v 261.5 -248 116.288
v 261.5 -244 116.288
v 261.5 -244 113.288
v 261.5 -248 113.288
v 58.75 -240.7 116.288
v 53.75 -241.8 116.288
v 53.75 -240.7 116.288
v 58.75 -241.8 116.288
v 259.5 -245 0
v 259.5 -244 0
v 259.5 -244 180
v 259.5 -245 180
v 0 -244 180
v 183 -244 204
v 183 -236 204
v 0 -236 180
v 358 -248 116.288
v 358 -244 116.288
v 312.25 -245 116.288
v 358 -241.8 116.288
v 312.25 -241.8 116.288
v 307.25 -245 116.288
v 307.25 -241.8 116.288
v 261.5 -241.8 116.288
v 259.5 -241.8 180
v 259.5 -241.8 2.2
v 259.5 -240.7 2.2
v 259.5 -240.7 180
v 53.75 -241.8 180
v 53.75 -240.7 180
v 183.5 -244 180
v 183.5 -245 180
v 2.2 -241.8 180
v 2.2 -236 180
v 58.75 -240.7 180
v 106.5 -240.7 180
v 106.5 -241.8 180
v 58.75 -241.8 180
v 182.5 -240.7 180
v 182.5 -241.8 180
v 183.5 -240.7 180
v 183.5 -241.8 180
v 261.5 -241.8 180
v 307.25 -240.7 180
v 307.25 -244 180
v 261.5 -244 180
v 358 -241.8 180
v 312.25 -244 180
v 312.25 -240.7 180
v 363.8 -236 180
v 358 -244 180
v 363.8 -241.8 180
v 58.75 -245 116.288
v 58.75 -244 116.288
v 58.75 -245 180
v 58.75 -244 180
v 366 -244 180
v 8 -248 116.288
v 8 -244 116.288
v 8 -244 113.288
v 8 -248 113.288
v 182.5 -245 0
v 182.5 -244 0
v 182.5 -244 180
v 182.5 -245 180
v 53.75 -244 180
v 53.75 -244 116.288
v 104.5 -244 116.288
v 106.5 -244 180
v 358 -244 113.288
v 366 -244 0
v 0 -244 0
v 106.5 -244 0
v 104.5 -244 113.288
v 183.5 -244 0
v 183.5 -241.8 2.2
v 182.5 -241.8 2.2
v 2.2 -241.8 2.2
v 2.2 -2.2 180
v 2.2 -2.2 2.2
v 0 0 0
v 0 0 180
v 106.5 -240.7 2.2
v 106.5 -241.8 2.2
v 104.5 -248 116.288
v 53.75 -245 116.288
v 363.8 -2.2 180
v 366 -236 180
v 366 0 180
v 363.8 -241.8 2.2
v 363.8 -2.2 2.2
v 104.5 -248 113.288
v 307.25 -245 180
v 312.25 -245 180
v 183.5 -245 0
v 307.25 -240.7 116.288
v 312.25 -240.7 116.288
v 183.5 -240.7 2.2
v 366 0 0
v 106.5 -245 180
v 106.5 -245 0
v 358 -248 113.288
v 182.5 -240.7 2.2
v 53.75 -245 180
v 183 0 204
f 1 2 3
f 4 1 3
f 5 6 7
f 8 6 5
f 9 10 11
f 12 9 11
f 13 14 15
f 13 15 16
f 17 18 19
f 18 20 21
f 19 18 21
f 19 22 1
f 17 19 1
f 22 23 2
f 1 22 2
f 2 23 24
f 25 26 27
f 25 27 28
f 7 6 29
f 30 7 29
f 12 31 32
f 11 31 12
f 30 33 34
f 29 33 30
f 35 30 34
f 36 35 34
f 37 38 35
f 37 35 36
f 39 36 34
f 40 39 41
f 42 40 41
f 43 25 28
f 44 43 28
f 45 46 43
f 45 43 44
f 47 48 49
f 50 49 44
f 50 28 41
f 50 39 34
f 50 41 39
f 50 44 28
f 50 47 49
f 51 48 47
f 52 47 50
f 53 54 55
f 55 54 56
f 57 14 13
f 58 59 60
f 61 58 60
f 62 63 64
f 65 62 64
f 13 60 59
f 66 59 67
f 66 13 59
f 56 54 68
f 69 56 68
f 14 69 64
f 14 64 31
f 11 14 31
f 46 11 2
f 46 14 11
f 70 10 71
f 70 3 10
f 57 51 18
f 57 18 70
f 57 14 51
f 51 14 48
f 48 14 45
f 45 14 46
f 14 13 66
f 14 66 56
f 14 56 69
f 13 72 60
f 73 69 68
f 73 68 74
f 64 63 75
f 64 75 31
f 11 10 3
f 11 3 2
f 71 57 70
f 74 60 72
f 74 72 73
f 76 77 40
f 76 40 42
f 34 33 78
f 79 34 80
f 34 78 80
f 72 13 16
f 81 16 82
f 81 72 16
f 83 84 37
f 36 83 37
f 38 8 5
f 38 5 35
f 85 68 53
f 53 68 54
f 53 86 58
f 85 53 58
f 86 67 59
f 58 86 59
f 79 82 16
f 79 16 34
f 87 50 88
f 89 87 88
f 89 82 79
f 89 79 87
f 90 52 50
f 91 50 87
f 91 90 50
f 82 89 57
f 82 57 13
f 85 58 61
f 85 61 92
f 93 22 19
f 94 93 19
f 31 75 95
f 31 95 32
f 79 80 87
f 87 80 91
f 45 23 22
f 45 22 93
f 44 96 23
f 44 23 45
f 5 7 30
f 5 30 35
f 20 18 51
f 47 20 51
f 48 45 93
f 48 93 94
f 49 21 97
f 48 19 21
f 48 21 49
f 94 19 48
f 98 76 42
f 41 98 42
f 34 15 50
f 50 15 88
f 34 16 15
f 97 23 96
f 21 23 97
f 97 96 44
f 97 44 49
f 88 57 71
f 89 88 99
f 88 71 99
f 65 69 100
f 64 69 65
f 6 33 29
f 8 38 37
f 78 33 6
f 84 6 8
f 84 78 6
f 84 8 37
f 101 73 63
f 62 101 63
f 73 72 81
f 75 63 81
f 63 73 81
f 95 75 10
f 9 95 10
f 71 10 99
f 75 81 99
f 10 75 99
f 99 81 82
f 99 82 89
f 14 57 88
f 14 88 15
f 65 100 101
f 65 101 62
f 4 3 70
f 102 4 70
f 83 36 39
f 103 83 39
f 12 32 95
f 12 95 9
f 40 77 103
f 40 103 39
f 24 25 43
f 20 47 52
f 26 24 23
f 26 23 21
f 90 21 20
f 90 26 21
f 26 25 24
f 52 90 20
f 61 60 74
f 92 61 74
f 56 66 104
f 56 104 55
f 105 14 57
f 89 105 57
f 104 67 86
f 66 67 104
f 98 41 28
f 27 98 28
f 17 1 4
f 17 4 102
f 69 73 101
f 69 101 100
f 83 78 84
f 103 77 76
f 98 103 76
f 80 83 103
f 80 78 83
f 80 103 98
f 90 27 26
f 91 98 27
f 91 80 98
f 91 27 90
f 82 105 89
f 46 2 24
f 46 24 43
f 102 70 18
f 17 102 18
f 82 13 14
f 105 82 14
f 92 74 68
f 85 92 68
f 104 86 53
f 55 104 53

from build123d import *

# Parameters (mm, degrees)
F0_W          = 366
F0_H          = 244
F0_W_2        = 361.6
F0_H_2        = 239.6
F1_DEPTH      = 180
F2_DEPTH      = 2.2
F3_W          = 76
F3_H          = 180
F3_W_2        = 5
F3_H_2        = 63.7124854326
F4_DEPTH      = 1
F4_DEPTH_BACK = 3.3
F3_W_3        = 45.75
F5_DEPTH      = 25
F6_DEPTH      = 8
F7_DEPTH      = 4
F9_DEPTH      = 244


# Not quite as in the source:
# - a feature names something its author has since deleted; it is built from what else it names


with BuildPart() as f1:
    # F0 (on Top) → F1 (new body)
    with BuildSketch(Plane.XY):
        with Locations((183, -122)):
            Rectangle(F0_W, F0_H)
        with Locations((183, -122)):
            Rectangle(F0_W_2, F0_H_2, mode=Mode.SUBTRACT)
    extrude(amount=F1_DEPTH)

    # F0 (on Top) → F2 (join)
    with BuildSketch(Plane.XY):
        with Locations((183, -122)):
            Rectangle(F0_W_2, F0_H_2)
    extrude(amount=F2_DEPTH)

    # F3 (on face) → F4 (join, two sides)
    with BuildSketch(Plane.XZ.offset(244)) as f4_sk:
        with Locations((144.5, 90)):
            Rectangle(F3_W, F3_H)
        with Locations((221.5, 90)):
            Rectangle(F3_W, F3_H)
        with Locations((56.25, 148.1437572837)):
            Rectangle(F3_W_2, F3_H_2)
        with Locations((309.75, 148.1437572837)):
            Rectangle(F3_W_2, F3_H_2)
    extrude(amount=F4_DEPTH)
    extrude(f4_sk.sketch, amount=-F4_DEPTH_BACK)

    # F3 (on face) → F5 (cut)
    with BuildSketch(Plane.XZ.offset(244)):
        Polygon((104.5, 180), (106.5, 180), (182.5, 180), (183.5, 180), (259.5, 180), (261.5, 180), (307.25, 180), (312.25, 180), (358, 180), (366, 180), (183, 204), (0, 180), (8, 180), (53.75, 180), (58.75, 180), align=None)
        with Locations((284.375, 148.1437572837)):
            Rectangle(F3_W_3, F3_H_2)
        with Locations((335.125, 148.1437572837)):
            Rectangle(F3_W_3, F3_H_2)
    extrude(amount=-F5_DEPTH, mode=Mode.SUBTRACT)

    # F3 (on face) → F6 (join)
    with BuildSketch(Plane.XZ.offset(244)):
        Polygon((104.5, 180), (106.5, 180), (182.5, 180), (183.5, 180), (259.5, 180), (261.5, 180), (307.25, 180), (312.25, 180), (358, 180), (366, 180), (183, 204), (0, 180), (8, 180), (53.75, 180), (58.75, 180), align=None)
    extrude(amount=-F6_DEPTH)

    # F3 (on face) → F7 (join)
    with BuildSketch(Plane.XZ.offset(244)):
        Polygon((307.25, 116.2875145674), (261.5, 116.2875145674), (261.5, 113.2875145674), (358, 113.2875145674), (358, 116.2875145674), (312.25, 116.2875145674), align=None)
        Polygon((104.5, 113.2875145674), (104.5, 116.2875145674), (58.75, 116.2875145674), (53.75, 116.2875145674), (8, 116.2875145674), (8, 113.2875145674), align=None)
    extrude(amount=F7_DEPTH)


with BuildPart() as f9:
    # F8 (on face) → F9 (new body)
    with BuildSketch(Plane(origin=(0, 0, 0), x_dir=(-1, 0, 0), z_dir=(0, 1, 0))):
        Polygon((-183, 204), (-366, 180), (0, 180), align=None)
    extrude(amount=-F9_DEPTH)


solid = Compound([f1.part, f9.part])
